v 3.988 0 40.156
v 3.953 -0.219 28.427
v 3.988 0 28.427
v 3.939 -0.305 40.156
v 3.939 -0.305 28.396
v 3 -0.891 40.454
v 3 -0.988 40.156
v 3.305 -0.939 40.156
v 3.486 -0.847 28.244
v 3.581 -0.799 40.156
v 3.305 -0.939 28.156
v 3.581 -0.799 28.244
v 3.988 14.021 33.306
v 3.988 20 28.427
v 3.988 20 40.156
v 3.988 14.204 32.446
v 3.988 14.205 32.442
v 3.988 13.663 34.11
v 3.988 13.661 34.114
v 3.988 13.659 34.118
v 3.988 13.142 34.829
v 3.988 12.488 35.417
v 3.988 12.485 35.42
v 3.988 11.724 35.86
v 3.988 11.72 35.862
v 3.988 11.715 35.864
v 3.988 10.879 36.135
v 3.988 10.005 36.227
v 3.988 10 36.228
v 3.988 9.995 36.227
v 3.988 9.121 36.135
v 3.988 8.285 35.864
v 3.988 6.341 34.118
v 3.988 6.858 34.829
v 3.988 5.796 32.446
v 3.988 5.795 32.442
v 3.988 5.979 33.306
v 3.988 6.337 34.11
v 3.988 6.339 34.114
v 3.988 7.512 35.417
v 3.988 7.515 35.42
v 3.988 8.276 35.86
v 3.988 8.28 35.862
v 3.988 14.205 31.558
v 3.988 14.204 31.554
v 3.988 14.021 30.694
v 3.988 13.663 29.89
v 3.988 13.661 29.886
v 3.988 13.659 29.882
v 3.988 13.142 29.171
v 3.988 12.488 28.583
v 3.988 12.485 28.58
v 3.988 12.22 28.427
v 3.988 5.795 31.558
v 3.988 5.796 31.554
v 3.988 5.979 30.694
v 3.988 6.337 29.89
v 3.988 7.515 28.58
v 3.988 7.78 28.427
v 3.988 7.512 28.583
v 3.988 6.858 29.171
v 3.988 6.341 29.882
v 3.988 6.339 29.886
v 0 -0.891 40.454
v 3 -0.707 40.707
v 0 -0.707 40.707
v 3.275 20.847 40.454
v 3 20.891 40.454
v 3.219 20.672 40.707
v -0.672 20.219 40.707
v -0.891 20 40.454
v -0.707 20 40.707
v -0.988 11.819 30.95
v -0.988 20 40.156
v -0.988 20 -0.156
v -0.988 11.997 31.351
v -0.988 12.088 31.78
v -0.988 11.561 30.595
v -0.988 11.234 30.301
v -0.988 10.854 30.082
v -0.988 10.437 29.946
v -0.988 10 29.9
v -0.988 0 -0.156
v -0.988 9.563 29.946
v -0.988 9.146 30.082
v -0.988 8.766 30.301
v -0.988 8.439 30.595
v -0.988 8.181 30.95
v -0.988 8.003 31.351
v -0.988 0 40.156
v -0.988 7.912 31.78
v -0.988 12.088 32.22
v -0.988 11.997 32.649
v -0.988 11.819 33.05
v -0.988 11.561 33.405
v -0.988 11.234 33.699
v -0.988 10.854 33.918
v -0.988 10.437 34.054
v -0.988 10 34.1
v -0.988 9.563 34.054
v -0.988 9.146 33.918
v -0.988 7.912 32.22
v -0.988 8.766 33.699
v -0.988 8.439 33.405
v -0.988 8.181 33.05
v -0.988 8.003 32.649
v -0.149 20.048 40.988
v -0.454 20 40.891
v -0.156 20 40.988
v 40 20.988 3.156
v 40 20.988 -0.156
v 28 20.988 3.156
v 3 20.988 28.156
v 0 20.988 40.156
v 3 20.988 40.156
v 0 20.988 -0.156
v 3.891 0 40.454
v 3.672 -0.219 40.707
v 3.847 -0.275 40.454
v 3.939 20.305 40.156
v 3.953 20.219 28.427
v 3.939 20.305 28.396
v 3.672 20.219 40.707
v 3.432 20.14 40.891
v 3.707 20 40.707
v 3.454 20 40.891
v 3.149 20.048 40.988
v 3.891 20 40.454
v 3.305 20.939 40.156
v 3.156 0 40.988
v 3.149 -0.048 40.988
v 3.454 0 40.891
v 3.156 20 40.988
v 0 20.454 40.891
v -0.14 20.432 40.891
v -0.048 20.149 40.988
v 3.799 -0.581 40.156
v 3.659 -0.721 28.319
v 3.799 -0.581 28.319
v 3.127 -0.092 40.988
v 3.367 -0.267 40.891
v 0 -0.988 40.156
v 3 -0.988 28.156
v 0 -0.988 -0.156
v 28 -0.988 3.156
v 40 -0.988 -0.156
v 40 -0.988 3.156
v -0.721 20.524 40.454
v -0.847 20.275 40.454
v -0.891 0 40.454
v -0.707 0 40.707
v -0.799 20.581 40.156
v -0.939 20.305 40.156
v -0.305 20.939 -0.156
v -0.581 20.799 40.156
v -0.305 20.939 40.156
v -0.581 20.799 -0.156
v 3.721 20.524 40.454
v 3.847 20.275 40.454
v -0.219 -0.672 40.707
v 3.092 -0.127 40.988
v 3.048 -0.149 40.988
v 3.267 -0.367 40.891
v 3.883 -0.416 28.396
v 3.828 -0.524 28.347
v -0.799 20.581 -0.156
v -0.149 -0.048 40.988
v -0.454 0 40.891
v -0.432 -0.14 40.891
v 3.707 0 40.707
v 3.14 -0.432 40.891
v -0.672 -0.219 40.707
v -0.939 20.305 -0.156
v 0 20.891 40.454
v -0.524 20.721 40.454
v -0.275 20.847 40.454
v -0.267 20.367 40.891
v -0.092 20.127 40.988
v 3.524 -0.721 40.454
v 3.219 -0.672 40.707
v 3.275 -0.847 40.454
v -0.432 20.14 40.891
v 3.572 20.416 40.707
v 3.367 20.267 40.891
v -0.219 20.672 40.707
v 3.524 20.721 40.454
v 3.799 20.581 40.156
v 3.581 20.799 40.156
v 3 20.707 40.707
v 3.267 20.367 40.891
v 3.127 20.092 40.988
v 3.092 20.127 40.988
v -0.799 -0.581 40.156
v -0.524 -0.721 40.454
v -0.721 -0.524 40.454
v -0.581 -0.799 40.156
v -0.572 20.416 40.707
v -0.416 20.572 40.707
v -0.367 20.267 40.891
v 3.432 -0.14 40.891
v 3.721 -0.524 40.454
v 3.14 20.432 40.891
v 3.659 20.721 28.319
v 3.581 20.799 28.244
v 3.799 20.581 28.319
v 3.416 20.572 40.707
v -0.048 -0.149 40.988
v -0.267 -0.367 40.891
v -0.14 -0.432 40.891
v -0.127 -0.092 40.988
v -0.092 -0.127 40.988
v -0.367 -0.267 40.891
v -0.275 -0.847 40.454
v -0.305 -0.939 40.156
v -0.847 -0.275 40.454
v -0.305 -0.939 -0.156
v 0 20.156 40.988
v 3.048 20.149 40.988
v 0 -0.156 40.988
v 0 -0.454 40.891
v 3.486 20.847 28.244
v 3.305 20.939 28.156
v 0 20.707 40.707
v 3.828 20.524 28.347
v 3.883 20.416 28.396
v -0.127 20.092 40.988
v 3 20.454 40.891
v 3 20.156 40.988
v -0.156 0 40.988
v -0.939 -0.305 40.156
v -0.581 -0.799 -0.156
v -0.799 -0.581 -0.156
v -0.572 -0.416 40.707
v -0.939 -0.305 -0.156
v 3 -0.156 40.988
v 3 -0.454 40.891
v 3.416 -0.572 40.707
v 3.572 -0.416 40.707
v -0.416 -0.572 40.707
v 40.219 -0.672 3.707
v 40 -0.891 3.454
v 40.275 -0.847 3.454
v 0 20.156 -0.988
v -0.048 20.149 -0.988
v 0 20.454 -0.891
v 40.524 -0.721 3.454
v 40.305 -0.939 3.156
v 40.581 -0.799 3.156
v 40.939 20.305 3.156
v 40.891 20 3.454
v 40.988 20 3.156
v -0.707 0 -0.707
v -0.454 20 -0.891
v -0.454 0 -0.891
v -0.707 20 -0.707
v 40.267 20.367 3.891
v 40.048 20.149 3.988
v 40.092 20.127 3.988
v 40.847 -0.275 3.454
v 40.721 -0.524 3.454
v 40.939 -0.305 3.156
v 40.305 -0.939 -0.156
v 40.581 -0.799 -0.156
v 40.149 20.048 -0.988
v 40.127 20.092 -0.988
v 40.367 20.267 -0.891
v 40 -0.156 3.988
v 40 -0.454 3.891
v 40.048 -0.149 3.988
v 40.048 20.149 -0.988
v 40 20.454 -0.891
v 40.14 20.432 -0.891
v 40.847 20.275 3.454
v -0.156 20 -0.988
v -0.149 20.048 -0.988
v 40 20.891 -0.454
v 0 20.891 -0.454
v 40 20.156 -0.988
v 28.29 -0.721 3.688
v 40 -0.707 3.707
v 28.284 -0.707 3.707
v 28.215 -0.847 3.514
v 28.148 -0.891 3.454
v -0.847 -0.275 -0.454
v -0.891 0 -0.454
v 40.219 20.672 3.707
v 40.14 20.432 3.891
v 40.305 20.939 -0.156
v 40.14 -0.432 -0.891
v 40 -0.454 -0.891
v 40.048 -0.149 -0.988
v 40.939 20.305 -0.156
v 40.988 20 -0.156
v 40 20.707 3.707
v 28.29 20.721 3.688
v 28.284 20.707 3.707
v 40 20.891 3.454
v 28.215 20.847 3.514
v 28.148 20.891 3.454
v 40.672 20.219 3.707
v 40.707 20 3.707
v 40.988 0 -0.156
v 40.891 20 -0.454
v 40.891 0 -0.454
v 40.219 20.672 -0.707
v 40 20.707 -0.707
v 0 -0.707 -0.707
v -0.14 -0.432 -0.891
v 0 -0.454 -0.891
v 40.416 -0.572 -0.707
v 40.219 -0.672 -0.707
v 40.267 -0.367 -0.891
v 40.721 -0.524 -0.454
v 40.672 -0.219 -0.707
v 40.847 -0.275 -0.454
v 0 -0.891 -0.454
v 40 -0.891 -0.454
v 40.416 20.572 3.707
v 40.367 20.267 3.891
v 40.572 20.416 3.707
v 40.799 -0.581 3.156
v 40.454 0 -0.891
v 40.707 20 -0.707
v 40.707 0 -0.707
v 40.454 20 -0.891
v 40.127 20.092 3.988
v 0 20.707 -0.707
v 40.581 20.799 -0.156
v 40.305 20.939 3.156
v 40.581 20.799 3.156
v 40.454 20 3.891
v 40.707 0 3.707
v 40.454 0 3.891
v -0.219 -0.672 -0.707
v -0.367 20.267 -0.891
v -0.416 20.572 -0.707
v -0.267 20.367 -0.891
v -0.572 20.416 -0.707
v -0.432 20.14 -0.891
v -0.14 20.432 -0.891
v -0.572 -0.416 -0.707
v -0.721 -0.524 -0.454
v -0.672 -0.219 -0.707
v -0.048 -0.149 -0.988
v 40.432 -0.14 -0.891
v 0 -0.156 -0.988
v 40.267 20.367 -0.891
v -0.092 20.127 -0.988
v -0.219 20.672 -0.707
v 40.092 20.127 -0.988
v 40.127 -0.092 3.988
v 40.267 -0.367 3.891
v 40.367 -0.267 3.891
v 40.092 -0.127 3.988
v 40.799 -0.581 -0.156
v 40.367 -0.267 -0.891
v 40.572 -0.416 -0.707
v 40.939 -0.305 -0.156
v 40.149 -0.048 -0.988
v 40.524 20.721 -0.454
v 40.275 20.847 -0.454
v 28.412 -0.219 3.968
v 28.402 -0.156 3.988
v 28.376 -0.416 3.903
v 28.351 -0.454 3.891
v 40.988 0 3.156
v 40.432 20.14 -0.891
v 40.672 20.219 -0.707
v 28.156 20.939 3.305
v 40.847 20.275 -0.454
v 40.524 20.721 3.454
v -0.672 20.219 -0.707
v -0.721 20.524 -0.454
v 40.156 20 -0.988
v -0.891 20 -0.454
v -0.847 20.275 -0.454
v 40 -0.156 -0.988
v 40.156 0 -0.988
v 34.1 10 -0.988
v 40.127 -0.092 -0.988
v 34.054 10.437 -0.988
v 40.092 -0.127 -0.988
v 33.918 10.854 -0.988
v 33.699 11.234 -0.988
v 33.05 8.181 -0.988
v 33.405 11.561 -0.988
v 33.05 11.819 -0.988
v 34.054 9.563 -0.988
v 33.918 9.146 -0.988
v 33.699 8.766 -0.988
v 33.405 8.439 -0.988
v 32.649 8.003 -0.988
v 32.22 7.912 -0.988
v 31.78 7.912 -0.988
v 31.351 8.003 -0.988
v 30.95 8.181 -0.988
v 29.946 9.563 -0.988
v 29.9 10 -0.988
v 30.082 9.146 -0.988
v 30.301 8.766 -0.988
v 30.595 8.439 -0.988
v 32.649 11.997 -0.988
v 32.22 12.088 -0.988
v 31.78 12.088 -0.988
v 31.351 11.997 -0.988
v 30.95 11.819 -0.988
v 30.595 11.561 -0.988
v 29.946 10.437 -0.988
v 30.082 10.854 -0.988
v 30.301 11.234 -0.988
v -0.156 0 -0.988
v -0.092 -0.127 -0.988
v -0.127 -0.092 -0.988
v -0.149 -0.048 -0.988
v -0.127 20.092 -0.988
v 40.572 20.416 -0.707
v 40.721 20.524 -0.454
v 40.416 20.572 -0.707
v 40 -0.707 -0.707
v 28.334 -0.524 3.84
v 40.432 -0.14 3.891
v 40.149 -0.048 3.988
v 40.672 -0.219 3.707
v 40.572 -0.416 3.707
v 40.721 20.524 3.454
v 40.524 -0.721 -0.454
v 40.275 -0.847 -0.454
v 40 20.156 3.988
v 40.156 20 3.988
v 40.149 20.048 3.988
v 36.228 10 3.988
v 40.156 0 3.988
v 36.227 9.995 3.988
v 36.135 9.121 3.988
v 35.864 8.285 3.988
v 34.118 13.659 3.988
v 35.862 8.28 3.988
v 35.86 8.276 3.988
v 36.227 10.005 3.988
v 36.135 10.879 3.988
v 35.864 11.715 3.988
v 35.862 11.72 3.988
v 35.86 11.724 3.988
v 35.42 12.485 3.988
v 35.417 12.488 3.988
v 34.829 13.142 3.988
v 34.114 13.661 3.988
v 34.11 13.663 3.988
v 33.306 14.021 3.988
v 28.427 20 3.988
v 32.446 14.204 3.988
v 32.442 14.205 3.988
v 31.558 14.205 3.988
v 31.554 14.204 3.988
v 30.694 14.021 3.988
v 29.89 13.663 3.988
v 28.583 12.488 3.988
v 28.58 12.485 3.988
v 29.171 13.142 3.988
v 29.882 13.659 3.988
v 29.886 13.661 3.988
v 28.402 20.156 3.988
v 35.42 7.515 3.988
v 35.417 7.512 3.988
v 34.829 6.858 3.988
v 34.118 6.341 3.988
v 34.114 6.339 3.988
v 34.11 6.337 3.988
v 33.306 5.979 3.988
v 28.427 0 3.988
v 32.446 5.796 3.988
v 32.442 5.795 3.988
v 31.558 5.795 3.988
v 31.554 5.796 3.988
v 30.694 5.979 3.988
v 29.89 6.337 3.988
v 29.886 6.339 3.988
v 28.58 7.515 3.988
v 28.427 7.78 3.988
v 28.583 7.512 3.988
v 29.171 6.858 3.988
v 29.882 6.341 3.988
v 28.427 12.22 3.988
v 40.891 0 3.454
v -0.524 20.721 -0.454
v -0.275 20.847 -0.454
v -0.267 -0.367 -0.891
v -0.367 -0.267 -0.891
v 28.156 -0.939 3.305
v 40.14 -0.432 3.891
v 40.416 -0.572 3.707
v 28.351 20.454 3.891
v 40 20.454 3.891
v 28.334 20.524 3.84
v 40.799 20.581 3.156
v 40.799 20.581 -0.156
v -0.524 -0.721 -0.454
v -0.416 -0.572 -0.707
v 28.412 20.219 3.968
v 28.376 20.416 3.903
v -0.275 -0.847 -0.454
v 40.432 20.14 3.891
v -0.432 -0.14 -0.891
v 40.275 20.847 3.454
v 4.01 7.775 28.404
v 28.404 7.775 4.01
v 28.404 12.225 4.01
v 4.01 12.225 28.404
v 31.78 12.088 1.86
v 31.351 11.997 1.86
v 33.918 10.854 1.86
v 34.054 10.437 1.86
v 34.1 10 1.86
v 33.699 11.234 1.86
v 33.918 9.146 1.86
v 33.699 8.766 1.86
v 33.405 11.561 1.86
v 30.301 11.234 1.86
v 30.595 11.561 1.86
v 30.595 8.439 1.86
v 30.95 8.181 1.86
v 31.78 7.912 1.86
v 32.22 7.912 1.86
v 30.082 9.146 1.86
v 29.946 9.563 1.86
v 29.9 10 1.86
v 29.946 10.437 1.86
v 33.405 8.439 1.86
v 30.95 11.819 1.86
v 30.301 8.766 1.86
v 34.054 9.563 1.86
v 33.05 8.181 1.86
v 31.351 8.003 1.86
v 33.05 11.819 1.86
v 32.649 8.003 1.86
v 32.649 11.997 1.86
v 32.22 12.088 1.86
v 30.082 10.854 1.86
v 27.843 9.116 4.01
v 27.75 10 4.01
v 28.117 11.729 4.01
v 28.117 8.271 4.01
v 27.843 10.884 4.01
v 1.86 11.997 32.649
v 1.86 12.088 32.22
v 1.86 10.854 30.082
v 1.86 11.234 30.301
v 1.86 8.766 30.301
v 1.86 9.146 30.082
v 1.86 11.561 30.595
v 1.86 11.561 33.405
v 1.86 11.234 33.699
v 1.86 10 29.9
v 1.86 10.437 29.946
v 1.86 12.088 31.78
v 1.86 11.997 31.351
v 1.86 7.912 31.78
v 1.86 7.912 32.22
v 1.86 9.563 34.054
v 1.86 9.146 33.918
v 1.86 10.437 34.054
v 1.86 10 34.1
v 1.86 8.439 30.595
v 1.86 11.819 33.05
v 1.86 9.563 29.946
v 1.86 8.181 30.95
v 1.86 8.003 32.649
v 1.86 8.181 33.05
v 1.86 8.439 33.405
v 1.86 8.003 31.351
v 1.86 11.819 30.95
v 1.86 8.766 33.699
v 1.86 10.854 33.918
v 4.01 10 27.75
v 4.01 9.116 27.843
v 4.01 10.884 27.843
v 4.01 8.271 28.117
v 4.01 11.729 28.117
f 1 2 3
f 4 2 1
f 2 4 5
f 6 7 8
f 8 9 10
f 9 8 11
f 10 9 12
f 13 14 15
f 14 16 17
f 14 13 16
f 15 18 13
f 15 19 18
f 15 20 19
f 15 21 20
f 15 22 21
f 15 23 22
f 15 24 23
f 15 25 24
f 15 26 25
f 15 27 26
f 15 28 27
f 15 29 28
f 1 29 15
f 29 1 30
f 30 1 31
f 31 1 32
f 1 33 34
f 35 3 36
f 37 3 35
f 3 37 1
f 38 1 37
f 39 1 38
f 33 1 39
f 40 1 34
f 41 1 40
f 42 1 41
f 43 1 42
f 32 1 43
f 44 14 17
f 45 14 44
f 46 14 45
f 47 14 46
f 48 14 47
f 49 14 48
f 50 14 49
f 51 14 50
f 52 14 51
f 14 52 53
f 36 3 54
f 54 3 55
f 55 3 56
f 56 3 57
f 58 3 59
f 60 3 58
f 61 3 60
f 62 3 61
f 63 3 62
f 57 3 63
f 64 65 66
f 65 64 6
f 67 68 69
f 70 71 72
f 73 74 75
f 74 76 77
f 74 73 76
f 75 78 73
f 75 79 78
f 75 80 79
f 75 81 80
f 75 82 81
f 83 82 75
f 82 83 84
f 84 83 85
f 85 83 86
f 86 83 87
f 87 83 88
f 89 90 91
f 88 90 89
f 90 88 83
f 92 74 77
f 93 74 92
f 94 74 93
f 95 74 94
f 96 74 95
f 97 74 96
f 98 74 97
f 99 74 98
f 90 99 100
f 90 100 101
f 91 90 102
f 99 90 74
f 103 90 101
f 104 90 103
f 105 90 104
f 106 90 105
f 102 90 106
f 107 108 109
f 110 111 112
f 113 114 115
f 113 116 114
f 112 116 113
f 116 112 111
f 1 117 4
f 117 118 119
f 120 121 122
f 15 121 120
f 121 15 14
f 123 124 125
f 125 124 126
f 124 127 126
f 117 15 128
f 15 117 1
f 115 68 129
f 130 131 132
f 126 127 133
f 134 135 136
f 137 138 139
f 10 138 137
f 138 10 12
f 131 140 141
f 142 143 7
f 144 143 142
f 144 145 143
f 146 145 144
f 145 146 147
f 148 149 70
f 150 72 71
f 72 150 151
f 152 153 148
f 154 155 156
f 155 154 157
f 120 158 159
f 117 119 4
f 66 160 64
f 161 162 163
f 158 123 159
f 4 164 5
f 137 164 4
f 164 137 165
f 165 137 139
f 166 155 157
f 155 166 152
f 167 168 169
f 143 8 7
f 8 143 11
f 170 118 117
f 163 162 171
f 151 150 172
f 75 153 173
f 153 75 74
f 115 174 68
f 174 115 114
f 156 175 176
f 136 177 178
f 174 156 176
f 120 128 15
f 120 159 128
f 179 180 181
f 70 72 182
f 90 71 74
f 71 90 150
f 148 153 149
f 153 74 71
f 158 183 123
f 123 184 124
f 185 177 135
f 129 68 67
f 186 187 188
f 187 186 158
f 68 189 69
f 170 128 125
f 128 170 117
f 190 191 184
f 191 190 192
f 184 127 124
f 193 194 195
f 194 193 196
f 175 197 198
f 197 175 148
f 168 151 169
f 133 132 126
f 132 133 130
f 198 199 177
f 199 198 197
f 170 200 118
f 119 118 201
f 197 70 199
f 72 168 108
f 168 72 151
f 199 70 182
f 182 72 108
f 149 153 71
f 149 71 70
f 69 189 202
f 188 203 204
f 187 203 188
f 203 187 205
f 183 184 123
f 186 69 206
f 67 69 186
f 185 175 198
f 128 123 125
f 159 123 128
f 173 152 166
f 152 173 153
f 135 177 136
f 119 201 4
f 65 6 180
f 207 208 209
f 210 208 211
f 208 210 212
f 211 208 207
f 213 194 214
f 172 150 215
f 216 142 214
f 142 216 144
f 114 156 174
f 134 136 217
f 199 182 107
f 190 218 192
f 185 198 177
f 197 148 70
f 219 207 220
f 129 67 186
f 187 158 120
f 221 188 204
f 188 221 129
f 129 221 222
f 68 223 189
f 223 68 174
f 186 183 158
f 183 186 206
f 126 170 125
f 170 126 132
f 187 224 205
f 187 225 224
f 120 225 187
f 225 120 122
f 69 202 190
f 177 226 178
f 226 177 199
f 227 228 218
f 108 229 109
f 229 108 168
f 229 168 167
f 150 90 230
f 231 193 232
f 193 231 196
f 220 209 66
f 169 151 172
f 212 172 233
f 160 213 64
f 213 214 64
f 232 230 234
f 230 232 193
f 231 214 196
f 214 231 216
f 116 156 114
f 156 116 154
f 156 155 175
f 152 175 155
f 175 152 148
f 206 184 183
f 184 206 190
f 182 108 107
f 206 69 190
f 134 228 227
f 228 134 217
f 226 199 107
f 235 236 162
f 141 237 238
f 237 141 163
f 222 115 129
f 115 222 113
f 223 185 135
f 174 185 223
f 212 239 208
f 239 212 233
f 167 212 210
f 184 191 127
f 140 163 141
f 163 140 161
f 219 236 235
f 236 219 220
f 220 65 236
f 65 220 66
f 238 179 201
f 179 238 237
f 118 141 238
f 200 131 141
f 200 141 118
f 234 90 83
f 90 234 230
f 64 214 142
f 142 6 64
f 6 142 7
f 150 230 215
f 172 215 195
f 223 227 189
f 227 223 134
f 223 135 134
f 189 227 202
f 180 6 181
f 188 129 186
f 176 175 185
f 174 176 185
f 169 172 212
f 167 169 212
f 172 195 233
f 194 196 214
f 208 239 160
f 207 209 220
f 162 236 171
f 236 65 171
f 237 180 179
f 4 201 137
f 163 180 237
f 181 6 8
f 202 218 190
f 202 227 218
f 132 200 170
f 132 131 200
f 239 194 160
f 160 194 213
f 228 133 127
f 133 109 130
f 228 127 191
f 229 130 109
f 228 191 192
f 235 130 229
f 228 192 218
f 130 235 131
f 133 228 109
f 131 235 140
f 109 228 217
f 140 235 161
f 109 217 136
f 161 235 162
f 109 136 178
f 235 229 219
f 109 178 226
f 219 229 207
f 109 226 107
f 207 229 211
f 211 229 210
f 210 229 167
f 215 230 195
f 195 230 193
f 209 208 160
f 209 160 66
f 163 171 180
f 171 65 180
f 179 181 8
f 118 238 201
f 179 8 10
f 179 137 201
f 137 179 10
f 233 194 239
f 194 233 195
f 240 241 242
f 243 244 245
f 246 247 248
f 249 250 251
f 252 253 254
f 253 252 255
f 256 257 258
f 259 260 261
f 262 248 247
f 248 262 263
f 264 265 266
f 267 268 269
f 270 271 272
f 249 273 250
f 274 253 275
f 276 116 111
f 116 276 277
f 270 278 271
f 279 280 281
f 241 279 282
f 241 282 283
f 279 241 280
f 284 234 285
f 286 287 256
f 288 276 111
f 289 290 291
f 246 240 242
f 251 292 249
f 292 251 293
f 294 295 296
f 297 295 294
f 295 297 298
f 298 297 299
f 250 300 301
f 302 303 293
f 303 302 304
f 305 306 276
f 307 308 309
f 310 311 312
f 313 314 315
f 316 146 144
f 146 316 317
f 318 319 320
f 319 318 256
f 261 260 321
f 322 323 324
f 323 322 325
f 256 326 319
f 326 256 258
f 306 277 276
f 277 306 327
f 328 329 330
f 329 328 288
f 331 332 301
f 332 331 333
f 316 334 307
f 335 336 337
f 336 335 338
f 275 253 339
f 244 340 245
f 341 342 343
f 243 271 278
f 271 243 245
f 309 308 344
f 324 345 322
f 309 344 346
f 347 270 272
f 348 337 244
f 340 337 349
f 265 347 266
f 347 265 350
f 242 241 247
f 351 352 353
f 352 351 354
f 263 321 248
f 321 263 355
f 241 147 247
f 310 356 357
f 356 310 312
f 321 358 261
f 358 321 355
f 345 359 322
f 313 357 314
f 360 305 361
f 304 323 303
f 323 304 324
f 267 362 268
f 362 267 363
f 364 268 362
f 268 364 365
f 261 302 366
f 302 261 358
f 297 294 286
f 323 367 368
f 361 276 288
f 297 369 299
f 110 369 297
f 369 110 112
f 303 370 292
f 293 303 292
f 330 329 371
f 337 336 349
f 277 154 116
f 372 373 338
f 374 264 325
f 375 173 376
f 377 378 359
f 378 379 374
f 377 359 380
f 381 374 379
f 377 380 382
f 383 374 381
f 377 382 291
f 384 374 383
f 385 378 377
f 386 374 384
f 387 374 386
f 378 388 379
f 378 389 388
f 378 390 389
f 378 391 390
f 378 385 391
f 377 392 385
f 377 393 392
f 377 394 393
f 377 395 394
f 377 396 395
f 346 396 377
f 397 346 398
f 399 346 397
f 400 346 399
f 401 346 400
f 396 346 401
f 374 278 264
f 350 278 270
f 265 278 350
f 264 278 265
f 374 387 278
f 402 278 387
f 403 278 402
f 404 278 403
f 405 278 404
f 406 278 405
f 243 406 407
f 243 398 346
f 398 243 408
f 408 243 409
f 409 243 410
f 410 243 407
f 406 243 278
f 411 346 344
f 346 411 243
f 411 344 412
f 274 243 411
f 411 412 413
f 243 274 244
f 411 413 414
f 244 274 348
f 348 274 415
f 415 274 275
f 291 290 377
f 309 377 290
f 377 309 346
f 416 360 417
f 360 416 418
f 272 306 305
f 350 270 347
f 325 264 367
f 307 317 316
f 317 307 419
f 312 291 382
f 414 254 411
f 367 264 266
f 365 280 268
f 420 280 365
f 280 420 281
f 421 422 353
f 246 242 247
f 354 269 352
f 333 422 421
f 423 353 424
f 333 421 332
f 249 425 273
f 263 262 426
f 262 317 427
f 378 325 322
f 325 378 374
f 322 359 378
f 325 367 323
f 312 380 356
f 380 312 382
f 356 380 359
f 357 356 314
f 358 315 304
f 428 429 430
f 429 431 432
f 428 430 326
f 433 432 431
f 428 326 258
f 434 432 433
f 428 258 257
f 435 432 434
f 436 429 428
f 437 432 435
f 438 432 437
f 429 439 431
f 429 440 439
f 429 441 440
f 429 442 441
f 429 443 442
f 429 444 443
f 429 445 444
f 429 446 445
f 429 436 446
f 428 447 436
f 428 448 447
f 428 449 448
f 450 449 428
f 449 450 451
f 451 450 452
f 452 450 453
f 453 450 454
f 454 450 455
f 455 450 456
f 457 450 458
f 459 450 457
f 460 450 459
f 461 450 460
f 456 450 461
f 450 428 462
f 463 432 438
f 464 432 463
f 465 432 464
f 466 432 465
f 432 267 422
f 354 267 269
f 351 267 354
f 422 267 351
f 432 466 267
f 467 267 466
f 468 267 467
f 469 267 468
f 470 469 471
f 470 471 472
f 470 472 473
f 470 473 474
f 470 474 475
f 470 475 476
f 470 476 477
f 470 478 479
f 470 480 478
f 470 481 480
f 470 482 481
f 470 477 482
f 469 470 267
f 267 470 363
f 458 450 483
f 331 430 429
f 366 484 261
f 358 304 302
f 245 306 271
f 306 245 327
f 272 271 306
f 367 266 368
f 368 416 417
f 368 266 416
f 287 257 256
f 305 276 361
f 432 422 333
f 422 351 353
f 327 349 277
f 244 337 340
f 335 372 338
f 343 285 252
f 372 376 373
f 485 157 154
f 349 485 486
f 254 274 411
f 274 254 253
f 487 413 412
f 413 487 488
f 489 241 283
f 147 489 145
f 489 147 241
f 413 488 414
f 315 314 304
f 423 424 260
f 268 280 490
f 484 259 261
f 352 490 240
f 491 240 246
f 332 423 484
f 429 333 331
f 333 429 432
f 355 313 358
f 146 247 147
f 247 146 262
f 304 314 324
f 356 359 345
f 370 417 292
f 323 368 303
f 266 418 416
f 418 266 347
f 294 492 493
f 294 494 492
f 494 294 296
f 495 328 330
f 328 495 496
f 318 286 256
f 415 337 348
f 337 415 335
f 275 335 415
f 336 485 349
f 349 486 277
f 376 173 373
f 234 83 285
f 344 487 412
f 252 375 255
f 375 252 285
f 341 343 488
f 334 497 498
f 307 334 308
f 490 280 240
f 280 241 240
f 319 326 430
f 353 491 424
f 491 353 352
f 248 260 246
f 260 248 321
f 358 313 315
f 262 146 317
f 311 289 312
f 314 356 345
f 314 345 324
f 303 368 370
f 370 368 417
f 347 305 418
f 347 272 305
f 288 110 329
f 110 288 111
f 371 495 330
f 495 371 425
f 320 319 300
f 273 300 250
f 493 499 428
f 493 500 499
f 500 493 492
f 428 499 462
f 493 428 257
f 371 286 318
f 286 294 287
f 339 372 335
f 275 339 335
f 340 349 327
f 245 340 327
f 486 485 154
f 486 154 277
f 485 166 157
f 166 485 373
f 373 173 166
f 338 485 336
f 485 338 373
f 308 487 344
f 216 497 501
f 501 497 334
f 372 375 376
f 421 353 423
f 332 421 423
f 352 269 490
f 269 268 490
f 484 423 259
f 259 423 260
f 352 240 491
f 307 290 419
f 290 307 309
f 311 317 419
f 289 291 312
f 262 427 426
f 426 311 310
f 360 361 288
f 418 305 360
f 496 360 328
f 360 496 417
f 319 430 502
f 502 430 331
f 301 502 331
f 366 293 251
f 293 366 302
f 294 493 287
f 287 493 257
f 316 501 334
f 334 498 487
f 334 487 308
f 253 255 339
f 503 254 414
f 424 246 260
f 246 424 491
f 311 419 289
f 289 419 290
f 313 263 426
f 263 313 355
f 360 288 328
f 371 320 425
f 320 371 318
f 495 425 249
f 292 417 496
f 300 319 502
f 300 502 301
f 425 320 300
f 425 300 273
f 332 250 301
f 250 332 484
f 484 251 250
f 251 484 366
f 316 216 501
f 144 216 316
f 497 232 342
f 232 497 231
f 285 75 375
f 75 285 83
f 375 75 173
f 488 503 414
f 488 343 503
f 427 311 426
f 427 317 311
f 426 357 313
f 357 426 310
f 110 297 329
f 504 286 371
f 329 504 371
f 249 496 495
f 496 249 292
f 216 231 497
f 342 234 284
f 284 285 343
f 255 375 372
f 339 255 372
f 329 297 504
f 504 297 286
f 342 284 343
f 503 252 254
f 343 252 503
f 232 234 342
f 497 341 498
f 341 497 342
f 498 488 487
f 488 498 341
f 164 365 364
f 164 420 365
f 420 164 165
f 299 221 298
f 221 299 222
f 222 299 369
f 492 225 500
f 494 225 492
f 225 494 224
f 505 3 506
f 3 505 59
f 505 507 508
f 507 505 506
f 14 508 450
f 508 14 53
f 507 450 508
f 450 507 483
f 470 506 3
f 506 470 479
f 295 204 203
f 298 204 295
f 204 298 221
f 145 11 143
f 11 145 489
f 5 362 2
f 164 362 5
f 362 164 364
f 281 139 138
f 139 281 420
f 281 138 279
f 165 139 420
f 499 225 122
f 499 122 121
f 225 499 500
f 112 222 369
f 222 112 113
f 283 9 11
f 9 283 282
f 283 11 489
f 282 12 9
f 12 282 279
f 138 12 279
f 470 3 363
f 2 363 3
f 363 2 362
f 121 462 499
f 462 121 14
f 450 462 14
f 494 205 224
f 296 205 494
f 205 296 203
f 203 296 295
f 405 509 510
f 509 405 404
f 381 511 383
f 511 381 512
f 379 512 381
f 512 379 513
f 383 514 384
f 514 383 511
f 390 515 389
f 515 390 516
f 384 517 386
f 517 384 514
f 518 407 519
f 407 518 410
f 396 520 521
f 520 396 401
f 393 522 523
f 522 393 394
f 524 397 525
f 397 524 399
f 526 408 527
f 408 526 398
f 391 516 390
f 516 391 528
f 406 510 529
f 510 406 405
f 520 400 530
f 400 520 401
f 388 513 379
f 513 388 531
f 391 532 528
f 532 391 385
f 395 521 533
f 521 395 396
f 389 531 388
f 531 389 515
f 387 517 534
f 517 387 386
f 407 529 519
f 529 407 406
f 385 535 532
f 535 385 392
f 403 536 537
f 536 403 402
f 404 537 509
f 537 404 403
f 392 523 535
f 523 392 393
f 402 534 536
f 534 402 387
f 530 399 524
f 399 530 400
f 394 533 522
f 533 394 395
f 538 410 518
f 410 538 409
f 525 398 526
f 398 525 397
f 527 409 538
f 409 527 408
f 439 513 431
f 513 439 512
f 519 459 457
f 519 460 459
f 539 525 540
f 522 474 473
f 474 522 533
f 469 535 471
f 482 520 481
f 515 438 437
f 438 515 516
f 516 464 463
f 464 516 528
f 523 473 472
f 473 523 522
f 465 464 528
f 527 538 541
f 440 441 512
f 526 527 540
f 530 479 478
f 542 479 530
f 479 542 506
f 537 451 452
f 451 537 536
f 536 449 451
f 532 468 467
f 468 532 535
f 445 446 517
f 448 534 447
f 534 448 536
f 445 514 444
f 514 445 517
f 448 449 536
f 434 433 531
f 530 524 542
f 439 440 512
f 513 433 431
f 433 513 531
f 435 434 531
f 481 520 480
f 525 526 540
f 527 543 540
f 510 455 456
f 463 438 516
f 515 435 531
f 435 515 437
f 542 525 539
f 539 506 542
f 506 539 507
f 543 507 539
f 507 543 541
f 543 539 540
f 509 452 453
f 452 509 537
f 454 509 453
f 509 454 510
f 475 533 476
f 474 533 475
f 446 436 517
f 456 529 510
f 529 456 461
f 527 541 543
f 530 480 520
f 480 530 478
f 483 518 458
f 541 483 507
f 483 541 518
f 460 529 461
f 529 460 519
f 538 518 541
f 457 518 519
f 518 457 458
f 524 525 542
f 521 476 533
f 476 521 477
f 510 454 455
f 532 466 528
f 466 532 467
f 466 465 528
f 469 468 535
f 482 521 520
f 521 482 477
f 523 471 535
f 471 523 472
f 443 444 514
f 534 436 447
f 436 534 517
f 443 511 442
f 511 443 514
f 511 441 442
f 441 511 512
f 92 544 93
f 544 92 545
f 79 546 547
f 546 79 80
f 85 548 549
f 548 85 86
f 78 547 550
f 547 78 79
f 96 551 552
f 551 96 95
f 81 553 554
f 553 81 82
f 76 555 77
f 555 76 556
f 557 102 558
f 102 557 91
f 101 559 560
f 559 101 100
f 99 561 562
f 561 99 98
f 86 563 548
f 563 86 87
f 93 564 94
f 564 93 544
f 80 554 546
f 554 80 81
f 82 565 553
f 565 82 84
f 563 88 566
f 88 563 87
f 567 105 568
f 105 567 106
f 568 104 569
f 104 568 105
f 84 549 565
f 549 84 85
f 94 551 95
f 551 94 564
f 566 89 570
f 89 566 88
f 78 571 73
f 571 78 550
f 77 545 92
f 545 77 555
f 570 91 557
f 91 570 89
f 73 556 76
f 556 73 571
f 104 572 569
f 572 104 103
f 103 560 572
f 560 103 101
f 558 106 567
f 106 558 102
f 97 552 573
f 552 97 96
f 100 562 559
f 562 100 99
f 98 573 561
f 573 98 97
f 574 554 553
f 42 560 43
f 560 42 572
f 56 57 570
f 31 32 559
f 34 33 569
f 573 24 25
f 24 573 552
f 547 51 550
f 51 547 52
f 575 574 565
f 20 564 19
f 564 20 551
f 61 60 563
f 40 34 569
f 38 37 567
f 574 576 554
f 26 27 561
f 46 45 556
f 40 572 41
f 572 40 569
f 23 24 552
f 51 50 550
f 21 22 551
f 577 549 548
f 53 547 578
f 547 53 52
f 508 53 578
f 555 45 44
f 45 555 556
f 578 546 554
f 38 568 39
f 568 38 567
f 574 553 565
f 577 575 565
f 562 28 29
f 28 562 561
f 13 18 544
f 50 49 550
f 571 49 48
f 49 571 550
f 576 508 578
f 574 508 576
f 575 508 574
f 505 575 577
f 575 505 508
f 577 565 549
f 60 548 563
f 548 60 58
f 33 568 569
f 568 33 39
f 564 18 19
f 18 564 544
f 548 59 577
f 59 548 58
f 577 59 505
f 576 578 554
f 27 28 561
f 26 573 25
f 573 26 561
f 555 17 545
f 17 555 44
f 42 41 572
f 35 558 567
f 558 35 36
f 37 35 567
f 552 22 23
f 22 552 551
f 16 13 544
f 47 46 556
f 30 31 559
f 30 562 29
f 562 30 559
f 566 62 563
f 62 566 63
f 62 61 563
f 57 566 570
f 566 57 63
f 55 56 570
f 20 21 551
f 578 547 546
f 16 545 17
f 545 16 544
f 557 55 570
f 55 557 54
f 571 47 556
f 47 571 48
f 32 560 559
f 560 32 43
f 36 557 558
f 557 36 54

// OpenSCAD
// =====================================================================
//  19_GUSSET_L_BRACKET.SCAD — Parametric Rounded L-Bracket with Gusset
// =====================================================================

/* [1. Bracket Dimensions] */
// Bracket Width Along Y-Axis (mm) [15:15 mm, 20:20 mm (Standard), 25:25 mm (1"), 30:30 mm, 40:40 mm (Heavy)]
width = 20;

// Plate Wall Thickness (mm) [2.5:2.5 mm, 3.0:3.0 mm (Standard), 4.0:4.0 mm, 5.0:5.0 mm (Heavy Duty)]
thickness = 3;

// Vertical Wall Arm Height — Z Axis (mm) [25:25 mm (1"), 30:30 mm, 40:40 mm (Standard), 50:50 mm (2"), 60:60 mm, 80:80 mm]
wall_height = 40;

// Horizontal Protrusion Arm Length — X Axis (mm) [25:25 mm (1"), 30:30 mm, 40:40 mm (Standard), 50:50 mm (2"), 60:60 mm, 80:80 mm]
protrusion_length = 40;

/* [2. Gusset & Rounding Options] */
// Gusset Height Upward from Inside Corner (mm) [15:15 mm, 20:20 mm, 25:25 mm (Standard), 30:30 mm, 40:40 mm]
gusset_height = 25;

// Gusset Length Outward from Inside Corner (mm) [15:15 mm, 20:20 mm, 25:25 mm (Standard), 30:30 mm, 40:40 mm]
gusset_length = 25;

// Enable Minkowski Rounded Edges
round_corners = true;

// Edge Rounding Radius (mm) [0.6:0.6 mm, 1.0:1.0 mm (Standard), 1.5:1.5 mm, 2.0:2.0 mm] @show_if(round_corners=true)
corner_radius = 1;

/* [3. Countersunk Screw Holes] */
// Include Mounting Screw Holes
include_holes = true;

// Screw Hole Diameter (mm) [3.2:3.2 mm (M3), 4.2:4.2 mm (M4 / #8 Screw — Standard), 5.2:5.2 mm (M5 / #10 Screw), 6.4:6.4 mm (M6 / 1/4")] @show_if(include_holes=true)
screw_diameter = 4.2;

// Countersink Screw Holes for Flush Heads @show_if(include_holes=true)
countersink = true;

// Screw Head Countersink Diameter (mm) [6.5:6.5 mm (M3), 8.5:8.5 mm (M4 / #8 — Standard), 10.5:10.5 mm (M5 / #10), 12.5:12.5 mm (M6)] @show_if(include_holes=true)
countersink_diameter = 8.5;

// Hole Center Offset from Bracket Ends (mm) [6:6 mm, 8:8 mm (Standard), 10:10 mm, 12:12 mm] @show_if(include_holes=true)
hole_offset = 8;

/* [Hidden] */
echo(str("[SPEC] Gusset L-Bracket: ", wall_height, "×", protrusion_length, "×", width, " mm | Gusset: ", gusset_height, "×", gusset_length, " mm | Hole Ø", screw_diameter, " mm"));

l_bracket();

module l_bracket() {
    if (include_holes) {
        difference() {
            rounded_bracket();
            cut_holes();
        }
    } else {
        rounded_bracket();
    }
}

module rounded_bracket() {
    if (round_corners) {
        minkowski() {
            bracket_base();
            sphere(r=corner_radius, $fn=20);
        }
    } else {
        bracket_base();
    }
}

module bracket_base() {
    union() {
        cube([thickness, width, wall_height]);
        cube([protrusion_length, width, thickness]);
        translate([thickness, width, thickness])
        rotate([90, 0, 0])
        linear_extrude(height=width)
        polygon(points=[
            [0, 0],
            [gusset_length, 0],
            [0, gusset_height]
        ]);
    }
}

module cut_holes() {
    actual_thickness = round_corners ? thickness + corner_radius : thickness;
    cs_depth = (countersink_diameter - screw_diameter) / 2;
    $fn = 30;

    translate([protrusion_length - hole_offset, width / 2, -corner_radius - 1])
    cylinder(h=thickness + (corner_radius*2) + 2, d=screw_diameter);

    if (countersink) {
        translate([protrusion_length - hole_offset, width / 2, actual_thickness - cs_depth + 0.01])
        cylinder(h=cs_depth, d1=screw_diameter, d2=countersink_diameter);
    }

    translate([-corner_radius - 1, width / 2, wall_height - hole_offset])
    rotate([0, 90, 0])
    cylinder(h=thickness + (corner_radius*2) + 2, d=screw_diameter);

    if (countersink) {
        translate([actual_thickness - cs_depth + 0.01, width / 2, wall_height - hole_offset])
        rotate([0, 90, 0])
        cylinder(h=cs_depth, d1=screw_diameter, d2=countersink_diameter);
    }
}
